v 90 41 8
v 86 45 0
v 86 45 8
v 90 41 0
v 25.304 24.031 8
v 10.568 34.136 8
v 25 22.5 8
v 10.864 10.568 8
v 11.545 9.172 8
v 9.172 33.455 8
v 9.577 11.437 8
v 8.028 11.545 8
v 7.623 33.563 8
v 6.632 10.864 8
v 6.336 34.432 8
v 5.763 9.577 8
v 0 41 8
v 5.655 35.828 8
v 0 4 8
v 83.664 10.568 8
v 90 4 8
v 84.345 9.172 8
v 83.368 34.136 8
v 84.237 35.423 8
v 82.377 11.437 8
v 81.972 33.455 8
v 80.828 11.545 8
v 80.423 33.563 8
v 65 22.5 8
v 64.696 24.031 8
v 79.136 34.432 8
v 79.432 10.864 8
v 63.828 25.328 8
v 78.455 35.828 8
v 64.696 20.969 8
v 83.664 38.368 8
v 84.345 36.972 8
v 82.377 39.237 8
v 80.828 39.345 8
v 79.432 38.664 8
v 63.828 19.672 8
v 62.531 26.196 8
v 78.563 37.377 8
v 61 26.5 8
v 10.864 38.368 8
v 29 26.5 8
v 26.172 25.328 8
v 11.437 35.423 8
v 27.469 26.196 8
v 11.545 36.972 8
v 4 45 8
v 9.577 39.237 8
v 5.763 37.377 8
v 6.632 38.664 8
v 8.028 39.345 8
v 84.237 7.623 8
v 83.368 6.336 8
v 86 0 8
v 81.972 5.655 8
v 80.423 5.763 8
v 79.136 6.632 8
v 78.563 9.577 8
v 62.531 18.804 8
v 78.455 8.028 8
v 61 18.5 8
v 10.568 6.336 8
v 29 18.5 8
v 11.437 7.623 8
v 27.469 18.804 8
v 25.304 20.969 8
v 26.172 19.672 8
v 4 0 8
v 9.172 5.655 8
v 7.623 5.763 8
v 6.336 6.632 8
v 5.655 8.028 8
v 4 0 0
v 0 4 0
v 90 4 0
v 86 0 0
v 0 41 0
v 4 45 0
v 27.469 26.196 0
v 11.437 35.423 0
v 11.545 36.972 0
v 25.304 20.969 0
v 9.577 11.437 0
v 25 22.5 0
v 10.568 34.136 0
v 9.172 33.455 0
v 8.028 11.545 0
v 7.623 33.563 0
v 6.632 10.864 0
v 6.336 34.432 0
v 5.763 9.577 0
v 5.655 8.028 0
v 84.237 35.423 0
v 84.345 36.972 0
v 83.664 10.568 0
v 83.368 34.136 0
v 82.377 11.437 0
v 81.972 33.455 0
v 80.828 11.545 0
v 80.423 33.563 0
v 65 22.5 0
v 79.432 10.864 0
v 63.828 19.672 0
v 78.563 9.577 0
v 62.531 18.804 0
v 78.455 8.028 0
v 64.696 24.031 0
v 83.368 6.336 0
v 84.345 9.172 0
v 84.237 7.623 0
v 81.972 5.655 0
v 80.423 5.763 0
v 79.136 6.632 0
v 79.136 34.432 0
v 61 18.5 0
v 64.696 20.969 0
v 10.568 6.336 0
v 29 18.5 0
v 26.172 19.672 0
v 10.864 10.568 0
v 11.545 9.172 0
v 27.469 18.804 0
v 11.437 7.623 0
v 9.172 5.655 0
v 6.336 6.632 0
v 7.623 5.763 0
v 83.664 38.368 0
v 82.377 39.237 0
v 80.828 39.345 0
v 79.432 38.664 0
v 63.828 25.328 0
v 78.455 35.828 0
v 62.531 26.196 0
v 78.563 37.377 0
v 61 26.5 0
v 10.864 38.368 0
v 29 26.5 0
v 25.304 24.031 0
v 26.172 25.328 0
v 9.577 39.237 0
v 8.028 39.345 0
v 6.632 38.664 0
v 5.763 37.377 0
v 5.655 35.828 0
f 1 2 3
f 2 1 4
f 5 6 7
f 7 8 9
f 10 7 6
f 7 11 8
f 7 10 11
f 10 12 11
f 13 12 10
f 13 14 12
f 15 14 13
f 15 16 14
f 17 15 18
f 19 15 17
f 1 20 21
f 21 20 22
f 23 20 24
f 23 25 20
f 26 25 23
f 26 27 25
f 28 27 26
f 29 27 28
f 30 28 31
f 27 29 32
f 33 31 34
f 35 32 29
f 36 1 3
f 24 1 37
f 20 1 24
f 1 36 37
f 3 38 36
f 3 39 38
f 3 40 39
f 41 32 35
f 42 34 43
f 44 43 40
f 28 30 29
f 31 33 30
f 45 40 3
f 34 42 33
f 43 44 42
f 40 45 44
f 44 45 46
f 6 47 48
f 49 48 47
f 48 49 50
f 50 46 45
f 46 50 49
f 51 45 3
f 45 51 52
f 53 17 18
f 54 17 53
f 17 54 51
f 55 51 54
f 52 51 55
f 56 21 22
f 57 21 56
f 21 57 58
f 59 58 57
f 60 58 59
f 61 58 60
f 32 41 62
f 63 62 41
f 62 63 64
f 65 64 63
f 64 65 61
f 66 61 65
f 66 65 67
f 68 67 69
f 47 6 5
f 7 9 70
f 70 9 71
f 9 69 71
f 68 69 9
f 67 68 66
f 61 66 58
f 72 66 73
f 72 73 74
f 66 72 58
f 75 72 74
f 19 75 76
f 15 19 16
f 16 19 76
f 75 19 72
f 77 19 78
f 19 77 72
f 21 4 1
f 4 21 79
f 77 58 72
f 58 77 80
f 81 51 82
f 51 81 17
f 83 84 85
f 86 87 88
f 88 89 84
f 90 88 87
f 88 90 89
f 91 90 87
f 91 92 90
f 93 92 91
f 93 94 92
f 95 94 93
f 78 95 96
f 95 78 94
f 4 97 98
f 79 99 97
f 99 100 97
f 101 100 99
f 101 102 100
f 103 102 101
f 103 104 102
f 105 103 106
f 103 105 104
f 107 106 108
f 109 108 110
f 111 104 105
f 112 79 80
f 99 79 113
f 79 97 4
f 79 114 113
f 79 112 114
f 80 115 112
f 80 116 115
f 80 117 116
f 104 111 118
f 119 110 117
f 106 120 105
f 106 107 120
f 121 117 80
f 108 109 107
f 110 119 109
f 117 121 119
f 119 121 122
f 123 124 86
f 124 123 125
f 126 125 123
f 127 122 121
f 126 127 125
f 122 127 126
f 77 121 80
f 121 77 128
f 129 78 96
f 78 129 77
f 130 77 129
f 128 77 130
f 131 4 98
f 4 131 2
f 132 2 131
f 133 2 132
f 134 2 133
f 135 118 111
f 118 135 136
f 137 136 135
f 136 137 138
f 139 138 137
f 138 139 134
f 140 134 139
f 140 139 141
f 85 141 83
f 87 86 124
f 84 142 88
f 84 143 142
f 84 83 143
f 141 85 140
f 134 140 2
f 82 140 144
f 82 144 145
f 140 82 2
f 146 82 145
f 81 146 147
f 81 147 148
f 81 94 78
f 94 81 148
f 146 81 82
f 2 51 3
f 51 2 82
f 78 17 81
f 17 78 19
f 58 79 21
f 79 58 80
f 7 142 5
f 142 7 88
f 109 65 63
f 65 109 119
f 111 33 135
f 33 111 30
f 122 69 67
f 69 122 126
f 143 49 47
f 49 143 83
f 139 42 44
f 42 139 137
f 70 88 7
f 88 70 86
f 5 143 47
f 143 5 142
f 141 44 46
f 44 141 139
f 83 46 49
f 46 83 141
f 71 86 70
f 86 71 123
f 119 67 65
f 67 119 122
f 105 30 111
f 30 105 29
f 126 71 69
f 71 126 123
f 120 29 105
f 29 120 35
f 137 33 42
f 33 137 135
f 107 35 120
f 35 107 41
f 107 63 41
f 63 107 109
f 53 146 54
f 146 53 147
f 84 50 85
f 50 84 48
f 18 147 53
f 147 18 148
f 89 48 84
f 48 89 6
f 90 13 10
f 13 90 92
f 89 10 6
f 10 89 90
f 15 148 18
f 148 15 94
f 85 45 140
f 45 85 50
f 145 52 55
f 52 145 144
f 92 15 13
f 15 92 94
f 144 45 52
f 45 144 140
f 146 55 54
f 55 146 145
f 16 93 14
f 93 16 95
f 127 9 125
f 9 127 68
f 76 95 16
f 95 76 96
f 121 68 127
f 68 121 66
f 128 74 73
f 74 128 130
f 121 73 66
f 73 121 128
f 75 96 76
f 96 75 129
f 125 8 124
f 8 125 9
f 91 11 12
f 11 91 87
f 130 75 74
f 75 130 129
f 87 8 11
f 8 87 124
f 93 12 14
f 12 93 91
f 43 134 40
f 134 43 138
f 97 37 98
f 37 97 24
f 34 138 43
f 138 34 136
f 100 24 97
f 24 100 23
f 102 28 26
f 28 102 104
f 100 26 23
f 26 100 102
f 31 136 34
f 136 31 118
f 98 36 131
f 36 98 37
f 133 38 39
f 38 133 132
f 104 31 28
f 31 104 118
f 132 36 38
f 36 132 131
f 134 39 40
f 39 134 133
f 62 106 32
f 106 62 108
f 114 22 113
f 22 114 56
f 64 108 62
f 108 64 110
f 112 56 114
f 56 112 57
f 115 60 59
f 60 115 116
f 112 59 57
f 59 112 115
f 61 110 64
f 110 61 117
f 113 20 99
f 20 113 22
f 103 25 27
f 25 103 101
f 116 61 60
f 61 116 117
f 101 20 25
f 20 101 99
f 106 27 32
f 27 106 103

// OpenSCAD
$fn = 32;

// ----------------------------------------------------------------------
// Bracket plate: slot plate 90 x 45
// ----------------------------------------------------------------------

// --- parameters (mm) ---
hole_r = 3;               // bolt hole radius
plate_t = 8;              // plate thickness, Z (extrusion height)
plate_l = 90;             // plate length
plate_w = 45;             // plate width
slot_l = 32;              // slot straight length
slot_r = 4;               // slot end radius

slot_len = slot_l + 2 * slot_r;
slot_w = 2 * slot_r;
hole_d2 = 2 * hole_r;

profile = [[4, 0], [86, 0], [90, 4], [90, 41], [86, 45], [4, 45], [0, 41], [0, 4]];  // primary outline, 8 points, counter clockwise
void_1 = [[61, 18.5], [62.531, 18.804], [63.828, 19.672], [64.696, 20.969], [65, 22.5], [64.696, 24.031], [63.828, 25.328], [62.531, 26.196], [61, 26.5], [29, 26.5], [27.469, 26.196], [26.172, 25.328], [25.304, 24.031], [25, 22.5], [25.304, 20.969], [26.172, 19.672], [27.469, 18.804], [29, 18.5]];  // grip slot, 18 points
void_2 = [[11.545, 36.972], [10.864, 38.368], [9.577, 39.237], [8.028, 39.345], [6.632, 38.664], [5.763, 37.377], [5.655, 35.828], [6.336, 34.432], [7.623, 33.563], [9.172, 33.455], [10.568, 34.136], [11.437, 35.423]];  // corner hole, 12 points
void_3 = [[11.545, 9.172], [10.864, 10.568], [9.577, 11.437], [8.028, 11.545], [6.632, 10.864], [5.763, 9.577], [5.655, 8.028], [6.336, 6.632], [7.623, 5.763], [9.172, 5.655], [10.568, 6.336], [11.437, 7.623]];  // corner hole, 12 points
void_4 = [[84.345, 36.972], [83.664, 38.368], [82.377, 39.237], [80.828, 39.345], [79.432, 38.664], [78.563, 37.377], [78.455, 35.828], [79.136, 34.432], [80.423, 33.563], [81.972, 33.455], [83.368, 34.136], [84.237, 35.423]];  // corner hole, 12 points
void_5 = [[84.345, 9.172], [83.664, 10.568], [82.377, 11.437], [80.828, 11.545], [79.432, 10.864], [78.563, 9.577], [78.455, 8.028], [79.136, 6.632], [80.423, 5.763], [81.972, 5.655], [83.368, 6.336], [84.237, 7.623]];  // corner hole, 12 points

// --- the one profile operation ---
difference() {
  linear_extrude(height = plate_t) polygon(points = profile);
  translate([0, 0, -1])
    linear_extrude(height = plate_t + 2) polygon(points = void_1);
  translate([0, 0, -1])
    linear_extrude(height = plate_t + 2) polygon(points = void_2);
  translate([0, 0, -1])
    linear_extrude(height = plate_t + 2) polygon(points = void_3);
  translate([0, 0, -1])
    linear_extrude(height = plate_t + 2) polygon(points = void_4);
  translate([0, 0, -1])
    linear_extrude(height = plate_t + 2) polygon(points = void_5);
}
